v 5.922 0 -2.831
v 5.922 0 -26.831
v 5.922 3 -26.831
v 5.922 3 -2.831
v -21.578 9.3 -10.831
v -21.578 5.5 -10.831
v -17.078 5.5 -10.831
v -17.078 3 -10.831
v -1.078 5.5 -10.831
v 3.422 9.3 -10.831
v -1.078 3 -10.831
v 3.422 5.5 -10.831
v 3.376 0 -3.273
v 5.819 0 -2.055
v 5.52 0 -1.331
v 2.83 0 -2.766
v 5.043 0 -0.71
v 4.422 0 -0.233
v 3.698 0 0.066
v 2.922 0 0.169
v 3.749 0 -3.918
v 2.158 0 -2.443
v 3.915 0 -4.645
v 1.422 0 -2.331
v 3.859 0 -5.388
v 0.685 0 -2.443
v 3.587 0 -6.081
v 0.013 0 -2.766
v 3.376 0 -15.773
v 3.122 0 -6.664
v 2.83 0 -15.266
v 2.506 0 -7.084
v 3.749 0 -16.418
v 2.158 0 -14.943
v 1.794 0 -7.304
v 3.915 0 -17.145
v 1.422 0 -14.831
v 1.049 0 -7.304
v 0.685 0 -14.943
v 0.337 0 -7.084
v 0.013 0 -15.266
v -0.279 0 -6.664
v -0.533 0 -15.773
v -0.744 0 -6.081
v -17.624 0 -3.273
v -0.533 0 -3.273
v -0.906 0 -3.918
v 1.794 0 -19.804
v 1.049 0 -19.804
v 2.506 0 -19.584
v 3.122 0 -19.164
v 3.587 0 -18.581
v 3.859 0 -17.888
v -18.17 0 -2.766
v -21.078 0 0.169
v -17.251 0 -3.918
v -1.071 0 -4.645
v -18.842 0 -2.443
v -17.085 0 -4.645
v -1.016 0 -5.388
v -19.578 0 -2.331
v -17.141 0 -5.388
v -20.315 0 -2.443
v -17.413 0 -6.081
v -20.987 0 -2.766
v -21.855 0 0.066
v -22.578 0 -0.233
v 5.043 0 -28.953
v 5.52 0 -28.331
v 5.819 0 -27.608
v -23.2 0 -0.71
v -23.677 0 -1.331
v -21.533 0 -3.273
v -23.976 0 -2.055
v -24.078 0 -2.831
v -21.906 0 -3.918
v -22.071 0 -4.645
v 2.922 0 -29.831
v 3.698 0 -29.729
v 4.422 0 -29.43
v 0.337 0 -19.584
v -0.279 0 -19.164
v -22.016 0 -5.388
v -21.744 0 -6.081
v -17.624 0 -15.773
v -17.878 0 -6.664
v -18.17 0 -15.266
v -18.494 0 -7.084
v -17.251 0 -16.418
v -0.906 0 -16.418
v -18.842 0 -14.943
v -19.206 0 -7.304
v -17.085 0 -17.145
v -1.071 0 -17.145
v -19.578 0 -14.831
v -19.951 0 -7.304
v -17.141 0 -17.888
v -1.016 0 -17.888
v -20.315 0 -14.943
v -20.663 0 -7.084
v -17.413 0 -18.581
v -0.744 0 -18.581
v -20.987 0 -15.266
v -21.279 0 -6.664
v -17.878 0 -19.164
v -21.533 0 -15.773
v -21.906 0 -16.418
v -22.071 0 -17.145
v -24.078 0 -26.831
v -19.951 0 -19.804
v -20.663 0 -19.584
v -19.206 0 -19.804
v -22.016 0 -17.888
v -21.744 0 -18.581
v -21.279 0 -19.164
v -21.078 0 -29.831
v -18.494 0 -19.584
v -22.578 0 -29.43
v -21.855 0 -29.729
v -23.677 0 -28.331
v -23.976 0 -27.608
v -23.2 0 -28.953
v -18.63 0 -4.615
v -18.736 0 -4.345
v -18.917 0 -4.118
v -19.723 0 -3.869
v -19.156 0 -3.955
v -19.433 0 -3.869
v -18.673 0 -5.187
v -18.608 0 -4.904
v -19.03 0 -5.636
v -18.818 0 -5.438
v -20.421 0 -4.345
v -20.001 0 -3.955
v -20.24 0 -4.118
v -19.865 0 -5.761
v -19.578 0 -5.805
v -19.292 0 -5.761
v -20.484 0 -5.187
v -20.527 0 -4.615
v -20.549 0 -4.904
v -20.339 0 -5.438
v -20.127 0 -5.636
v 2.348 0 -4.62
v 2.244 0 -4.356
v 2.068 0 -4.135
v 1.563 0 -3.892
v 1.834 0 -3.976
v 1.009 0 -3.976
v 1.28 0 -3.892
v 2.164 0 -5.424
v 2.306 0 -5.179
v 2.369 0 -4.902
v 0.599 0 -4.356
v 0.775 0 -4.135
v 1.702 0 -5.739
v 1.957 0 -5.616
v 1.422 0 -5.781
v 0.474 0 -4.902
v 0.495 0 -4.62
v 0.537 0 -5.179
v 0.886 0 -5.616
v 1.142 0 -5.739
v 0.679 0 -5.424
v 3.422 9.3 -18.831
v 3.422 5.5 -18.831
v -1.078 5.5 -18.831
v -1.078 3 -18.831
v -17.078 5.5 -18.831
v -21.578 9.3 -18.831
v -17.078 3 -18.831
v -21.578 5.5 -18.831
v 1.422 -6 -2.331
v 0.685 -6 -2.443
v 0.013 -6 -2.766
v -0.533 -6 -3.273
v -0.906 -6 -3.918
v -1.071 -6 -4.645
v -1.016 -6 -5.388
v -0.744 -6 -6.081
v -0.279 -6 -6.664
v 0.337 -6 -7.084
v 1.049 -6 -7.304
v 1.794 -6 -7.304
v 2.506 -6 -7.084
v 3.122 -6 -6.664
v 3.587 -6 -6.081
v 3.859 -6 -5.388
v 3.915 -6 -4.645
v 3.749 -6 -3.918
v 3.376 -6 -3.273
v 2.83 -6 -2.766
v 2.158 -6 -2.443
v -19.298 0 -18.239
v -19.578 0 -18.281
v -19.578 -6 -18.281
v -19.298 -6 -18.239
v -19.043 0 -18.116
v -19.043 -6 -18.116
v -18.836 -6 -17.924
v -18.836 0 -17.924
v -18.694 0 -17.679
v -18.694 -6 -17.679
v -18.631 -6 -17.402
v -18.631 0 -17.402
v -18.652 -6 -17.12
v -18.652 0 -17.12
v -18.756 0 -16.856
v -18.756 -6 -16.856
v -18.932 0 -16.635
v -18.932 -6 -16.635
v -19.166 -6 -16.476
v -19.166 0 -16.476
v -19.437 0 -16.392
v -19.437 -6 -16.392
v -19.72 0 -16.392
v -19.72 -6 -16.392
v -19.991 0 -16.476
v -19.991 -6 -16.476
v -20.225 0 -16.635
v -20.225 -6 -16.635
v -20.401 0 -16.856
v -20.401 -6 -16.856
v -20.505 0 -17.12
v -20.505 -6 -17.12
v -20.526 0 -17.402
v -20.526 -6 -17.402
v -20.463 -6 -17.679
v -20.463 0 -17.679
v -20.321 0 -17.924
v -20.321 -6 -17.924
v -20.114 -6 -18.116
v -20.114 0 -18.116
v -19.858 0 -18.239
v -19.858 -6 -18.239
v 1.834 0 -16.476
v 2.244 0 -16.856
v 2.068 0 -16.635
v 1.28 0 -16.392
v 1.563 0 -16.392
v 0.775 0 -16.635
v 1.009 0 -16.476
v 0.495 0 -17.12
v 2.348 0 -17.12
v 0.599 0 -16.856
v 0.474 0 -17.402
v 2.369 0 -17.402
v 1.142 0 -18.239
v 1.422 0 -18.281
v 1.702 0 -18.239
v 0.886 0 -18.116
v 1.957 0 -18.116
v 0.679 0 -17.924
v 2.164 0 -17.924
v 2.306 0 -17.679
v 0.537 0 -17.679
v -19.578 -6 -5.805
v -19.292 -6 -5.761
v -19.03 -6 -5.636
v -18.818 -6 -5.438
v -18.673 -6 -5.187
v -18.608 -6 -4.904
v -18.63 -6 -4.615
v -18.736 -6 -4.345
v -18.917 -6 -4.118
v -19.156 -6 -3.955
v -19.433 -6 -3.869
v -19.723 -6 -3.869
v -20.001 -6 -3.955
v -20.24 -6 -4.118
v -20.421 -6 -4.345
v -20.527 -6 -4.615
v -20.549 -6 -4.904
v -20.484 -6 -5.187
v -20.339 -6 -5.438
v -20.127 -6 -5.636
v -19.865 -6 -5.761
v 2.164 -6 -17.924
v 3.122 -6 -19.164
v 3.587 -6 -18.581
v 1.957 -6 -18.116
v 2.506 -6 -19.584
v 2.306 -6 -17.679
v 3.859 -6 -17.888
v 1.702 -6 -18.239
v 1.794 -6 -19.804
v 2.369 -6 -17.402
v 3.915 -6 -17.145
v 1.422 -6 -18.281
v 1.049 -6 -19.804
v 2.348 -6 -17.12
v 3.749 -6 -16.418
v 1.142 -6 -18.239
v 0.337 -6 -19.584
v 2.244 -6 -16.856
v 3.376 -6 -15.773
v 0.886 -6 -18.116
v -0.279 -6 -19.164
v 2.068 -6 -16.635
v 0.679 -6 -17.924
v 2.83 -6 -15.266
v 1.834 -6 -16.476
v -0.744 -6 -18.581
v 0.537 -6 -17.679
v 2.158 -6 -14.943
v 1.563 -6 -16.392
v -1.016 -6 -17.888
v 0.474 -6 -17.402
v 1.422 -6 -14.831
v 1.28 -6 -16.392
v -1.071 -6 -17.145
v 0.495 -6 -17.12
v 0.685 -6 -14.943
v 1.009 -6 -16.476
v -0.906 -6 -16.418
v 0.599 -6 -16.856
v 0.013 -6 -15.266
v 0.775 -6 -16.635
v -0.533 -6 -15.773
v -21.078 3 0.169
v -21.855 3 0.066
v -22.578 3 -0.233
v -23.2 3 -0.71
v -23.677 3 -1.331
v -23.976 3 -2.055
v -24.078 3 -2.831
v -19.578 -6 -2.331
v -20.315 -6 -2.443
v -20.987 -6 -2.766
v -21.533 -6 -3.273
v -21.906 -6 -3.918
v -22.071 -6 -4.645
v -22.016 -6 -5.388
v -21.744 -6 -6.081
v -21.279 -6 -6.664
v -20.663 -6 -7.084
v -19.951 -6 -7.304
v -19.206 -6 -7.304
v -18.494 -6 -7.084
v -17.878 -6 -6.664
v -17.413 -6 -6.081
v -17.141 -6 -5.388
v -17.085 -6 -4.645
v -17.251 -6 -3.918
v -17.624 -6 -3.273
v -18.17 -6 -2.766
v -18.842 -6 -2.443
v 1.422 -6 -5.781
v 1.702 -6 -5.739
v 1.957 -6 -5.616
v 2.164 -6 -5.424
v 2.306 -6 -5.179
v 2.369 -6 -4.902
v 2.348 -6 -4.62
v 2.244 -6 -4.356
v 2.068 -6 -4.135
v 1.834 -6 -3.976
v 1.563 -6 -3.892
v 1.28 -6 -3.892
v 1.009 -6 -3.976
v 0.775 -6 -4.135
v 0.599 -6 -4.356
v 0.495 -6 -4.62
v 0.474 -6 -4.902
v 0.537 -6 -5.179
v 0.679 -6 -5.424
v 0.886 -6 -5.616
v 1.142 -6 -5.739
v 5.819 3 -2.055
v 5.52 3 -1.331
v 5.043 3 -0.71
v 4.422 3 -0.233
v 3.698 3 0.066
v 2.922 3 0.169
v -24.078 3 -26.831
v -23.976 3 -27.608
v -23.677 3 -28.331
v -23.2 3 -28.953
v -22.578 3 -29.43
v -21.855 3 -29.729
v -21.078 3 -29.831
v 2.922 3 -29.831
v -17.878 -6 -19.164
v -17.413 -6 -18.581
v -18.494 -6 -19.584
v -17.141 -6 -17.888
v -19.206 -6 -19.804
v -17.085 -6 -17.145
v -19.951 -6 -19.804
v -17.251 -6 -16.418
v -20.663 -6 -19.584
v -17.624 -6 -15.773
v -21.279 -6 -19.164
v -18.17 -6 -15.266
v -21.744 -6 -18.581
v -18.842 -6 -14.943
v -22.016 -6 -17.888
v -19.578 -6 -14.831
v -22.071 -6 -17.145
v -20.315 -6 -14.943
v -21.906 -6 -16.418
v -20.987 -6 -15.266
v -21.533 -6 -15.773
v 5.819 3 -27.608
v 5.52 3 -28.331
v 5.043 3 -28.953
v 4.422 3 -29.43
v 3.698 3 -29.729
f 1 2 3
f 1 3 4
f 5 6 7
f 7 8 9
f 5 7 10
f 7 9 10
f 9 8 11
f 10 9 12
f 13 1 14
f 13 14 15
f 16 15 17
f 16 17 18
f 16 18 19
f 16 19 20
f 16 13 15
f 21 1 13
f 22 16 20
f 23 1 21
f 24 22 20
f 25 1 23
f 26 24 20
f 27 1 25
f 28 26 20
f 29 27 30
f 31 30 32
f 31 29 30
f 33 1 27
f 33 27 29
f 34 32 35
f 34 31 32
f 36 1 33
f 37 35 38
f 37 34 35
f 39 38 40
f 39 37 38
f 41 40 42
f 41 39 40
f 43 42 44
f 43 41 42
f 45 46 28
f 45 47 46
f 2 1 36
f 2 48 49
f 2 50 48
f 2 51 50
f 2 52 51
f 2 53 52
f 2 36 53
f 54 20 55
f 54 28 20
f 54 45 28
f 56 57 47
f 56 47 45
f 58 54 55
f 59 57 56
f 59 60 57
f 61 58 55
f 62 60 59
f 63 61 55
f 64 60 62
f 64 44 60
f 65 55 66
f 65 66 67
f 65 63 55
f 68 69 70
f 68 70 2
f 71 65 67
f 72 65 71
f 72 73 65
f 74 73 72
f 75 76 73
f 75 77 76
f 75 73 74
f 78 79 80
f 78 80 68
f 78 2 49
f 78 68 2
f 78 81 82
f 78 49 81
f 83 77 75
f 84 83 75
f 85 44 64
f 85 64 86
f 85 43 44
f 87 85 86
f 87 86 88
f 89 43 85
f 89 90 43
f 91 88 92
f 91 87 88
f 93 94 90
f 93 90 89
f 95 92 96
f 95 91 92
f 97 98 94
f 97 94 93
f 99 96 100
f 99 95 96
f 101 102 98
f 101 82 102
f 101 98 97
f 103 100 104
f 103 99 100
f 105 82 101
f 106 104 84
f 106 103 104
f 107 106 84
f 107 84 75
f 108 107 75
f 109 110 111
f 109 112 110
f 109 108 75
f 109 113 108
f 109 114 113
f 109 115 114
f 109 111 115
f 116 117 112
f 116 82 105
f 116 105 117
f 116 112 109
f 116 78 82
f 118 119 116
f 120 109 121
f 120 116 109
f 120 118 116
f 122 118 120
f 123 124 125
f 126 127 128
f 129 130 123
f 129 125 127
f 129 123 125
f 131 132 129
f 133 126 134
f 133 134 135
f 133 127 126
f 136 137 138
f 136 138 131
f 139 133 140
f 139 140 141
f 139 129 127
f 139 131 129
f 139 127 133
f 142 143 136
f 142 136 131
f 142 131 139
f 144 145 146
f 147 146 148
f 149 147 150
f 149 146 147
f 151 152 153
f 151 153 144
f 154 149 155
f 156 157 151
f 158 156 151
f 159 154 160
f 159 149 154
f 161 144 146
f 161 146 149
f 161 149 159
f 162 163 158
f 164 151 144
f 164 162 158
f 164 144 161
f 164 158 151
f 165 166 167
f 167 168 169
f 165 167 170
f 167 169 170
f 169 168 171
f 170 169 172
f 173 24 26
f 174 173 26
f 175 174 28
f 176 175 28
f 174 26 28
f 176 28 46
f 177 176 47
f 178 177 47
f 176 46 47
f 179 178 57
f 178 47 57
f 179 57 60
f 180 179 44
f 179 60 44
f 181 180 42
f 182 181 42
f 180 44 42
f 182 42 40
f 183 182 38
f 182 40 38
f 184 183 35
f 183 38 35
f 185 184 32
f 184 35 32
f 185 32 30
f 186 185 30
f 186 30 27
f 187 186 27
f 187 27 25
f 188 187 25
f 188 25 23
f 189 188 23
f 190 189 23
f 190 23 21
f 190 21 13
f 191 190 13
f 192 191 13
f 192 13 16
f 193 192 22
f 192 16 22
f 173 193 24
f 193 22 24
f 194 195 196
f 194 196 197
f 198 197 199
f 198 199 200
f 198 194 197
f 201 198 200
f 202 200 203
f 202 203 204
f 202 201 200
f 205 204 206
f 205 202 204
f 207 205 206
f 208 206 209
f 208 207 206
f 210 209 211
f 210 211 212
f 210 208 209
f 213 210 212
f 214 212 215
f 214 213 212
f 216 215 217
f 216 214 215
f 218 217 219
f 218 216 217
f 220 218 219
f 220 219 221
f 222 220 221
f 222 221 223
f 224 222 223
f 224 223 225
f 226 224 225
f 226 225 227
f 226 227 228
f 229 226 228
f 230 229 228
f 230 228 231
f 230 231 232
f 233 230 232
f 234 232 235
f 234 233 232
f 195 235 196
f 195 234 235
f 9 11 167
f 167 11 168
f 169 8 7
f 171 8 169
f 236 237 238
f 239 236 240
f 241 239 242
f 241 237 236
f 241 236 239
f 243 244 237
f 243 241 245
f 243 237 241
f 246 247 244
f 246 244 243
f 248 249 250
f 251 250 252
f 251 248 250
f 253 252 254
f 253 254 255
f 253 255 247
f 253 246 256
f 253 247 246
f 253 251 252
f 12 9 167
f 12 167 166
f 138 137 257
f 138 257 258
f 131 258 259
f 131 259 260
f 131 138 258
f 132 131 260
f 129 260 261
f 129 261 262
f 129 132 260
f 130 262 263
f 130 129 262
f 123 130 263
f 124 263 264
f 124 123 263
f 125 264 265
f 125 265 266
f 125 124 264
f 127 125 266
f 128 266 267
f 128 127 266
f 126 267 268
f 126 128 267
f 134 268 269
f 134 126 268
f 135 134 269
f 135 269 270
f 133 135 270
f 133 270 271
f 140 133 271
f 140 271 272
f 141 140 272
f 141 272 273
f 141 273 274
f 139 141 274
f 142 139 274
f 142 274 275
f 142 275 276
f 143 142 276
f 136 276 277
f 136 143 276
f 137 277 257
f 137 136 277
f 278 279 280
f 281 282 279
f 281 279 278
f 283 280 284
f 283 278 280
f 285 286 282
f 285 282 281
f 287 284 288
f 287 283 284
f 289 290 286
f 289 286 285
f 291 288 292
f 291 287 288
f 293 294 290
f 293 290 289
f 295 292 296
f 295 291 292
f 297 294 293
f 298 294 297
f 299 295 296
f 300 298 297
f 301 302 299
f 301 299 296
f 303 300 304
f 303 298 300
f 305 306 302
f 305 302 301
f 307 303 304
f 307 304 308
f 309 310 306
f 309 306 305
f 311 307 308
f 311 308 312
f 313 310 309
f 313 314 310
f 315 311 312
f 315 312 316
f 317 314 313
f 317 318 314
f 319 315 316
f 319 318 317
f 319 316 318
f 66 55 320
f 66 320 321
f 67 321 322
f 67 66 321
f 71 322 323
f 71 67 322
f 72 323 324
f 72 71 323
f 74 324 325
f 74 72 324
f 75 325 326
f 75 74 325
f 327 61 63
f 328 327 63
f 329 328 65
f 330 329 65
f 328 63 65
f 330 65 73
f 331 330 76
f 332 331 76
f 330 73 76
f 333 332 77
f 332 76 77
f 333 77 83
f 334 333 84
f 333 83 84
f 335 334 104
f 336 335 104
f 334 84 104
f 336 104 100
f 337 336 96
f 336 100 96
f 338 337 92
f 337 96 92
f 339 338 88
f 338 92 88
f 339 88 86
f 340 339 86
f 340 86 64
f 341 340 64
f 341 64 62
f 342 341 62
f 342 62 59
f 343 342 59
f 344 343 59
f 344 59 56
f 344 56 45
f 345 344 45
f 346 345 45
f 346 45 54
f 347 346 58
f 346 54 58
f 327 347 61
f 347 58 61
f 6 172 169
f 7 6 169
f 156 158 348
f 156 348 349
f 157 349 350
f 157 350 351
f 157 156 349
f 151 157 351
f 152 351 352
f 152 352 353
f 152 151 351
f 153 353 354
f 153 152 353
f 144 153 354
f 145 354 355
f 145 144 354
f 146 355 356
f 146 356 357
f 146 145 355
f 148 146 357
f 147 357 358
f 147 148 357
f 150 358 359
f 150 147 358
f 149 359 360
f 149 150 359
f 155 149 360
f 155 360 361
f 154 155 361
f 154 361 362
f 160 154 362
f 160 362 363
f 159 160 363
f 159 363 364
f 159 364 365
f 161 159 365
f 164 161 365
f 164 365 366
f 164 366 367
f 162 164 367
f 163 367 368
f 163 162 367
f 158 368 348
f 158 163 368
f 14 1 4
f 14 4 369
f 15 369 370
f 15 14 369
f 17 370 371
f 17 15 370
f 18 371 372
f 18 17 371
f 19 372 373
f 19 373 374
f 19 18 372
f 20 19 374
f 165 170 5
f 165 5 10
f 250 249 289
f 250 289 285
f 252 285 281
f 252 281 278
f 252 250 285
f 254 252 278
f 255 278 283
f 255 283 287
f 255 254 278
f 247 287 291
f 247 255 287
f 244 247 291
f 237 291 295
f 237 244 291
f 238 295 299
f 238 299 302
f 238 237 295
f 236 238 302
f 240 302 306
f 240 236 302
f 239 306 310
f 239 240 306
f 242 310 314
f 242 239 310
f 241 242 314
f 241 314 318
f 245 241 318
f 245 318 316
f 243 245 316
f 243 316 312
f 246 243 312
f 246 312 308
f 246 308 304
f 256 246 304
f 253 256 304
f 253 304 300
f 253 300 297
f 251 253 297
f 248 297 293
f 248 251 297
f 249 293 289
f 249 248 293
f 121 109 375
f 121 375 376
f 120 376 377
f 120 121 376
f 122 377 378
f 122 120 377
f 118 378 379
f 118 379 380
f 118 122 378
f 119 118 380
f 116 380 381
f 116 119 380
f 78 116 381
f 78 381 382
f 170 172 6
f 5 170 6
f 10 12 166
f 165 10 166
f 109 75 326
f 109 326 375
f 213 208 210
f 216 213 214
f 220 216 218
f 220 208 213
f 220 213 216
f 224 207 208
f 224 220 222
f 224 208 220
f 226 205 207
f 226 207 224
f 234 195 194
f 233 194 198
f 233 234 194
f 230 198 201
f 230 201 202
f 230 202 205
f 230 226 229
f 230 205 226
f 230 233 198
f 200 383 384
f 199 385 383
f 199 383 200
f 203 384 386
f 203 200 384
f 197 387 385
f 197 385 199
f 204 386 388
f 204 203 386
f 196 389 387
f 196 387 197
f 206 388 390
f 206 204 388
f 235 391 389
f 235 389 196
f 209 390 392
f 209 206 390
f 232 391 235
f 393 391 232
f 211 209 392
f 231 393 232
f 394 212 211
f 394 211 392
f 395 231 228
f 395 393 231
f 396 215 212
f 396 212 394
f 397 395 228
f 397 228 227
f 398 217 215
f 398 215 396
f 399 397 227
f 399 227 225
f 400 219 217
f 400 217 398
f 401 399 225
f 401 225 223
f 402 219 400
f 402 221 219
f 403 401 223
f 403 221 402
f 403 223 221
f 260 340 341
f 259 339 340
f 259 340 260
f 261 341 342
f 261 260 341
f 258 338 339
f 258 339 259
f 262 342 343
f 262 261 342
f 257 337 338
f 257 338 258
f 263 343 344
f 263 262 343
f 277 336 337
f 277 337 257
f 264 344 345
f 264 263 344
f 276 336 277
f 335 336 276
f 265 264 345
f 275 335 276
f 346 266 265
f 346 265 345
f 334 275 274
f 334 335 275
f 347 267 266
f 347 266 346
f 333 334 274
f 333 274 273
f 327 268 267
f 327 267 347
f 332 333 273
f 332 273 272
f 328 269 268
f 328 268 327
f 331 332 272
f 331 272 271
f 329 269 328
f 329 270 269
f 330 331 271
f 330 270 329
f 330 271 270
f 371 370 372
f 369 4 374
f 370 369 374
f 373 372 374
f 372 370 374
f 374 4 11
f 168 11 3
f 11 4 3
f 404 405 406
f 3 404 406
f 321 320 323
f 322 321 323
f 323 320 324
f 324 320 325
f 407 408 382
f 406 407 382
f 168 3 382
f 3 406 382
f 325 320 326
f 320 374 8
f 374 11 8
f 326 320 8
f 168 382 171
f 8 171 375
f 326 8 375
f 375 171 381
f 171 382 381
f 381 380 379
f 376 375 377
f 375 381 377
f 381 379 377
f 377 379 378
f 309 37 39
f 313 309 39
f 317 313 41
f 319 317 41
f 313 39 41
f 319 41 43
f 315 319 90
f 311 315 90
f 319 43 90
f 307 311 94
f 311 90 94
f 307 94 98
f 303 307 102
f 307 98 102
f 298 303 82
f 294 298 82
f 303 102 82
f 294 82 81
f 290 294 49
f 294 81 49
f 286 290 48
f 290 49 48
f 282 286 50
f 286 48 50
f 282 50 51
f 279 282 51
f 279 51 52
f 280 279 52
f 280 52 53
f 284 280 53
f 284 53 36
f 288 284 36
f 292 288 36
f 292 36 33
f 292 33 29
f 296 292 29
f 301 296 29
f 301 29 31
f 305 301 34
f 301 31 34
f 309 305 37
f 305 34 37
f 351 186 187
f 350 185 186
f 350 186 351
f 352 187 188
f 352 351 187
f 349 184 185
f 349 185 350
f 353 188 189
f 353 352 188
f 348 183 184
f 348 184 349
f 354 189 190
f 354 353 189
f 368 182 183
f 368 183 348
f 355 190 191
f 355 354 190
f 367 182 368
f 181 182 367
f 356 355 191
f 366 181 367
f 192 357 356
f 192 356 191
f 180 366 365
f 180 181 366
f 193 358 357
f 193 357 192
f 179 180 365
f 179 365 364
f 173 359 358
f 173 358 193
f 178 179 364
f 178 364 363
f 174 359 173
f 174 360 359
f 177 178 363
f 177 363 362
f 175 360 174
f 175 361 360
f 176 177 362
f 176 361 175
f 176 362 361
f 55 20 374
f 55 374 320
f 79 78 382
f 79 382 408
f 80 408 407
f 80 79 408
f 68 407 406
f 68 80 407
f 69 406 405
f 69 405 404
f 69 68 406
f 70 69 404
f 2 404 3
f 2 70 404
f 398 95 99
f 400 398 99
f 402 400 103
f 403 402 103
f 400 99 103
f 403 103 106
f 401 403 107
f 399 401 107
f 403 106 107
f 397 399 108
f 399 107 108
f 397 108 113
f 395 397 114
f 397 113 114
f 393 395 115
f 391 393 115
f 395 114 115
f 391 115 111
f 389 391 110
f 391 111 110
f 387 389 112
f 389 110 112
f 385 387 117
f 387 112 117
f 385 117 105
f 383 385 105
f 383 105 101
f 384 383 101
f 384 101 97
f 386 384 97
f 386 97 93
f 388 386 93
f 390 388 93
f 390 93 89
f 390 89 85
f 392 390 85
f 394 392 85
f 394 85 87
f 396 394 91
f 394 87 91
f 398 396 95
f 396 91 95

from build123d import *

# Parameters (mm, degrees)
EXTRUDE_2_DEPTH = 3
SKETCH_4_R      = 2.5
SKETCH_4_R_2    = 0.95
SKETCH_4_R_3    = 0.973149492
EXTRUDE_5_DEPTH = 6
SKETCH_6_W      = 16
SKETCH_6_H      = 8
EXTRUDE_6_DEPTH = 2.5
EXTRUDE_7_DEPTH = 3.8


with BuildPart() as part:
    # Эскиз1 → Бобышка-Вытянуть2 (new body)
    with BuildSketch(Plane(origin=(0, 0, 0), x_dir=(1, 0, 0), z_dir=(0, 1, 0))):
        with BuildLine():
            Line((-21.078452696, 29.831456886), (2.921547304, 29.831456886))
            ThreePointArc((2.921547304, 29.831456886), (5.042867648, 28.95277723), (5.921547304, 26.831456886))
            Line((5.921547304, 26.831456886), (5.921547304, 2.831456886))
            ThreePointArc((5.921547304, 2.831456886), (5.042867648, 0.710136543), (2.921547304, -0.168543114))
            Line((2.921547304, -0.168543114), (-21.078452696, -0.168543114))
            ThreePointArc((-21.078452696, -0.168543114), (-23.19977304, 0.710136543), (-24.078452696, 2.831456886))
            Line((-24.078452696, 2.831456886), (-24.078452696, 26.831456886))
            ThreePointArc((-24.078452696, 26.831456886), (-23.19977304, 28.95277723), (-21.078452696, 29.831456886))
        make_face()
    extrude(amount=EXTRUDE_2_DEPTH)

    # Эскиз4 → Бобышка-Вытянуть5 (add)
    # profile 1 of 4: a face of its own
    with BuildSketch(Plane.XZ):
        with Locations(Location((1.421547304, -4.831456886, 0), (0, 0, 90))):
            Circle(SKETCH_4_R)
        with Locations(Location((1.421547304, -4.831456886, 0), (0, 0, 270))):
            Circle(SKETCH_4_R_2, mode=Mode.SUBTRACT)
    # profile 2 of 4: a face of its own
    with BuildSketch(Plane.XZ):
        with Locations(Location((-19.578452696, -4.831456886, 0), (0, 0, 90))):
            Circle(SKETCH_4_R)
        with Locations(Location((-19.578452696, -4.831456886, 0), (0, 0, 270))):
            Circle(SKETCH_4_R_3, mode=Mode.SUBTRACT)
    # profile 3 of 4: a face of its own
    with BuildSketch(Plane.XZ):
        with Locations(Location((1.421547304, -17.331456886, 0), (0, 0, 90))):
            Circle(SKETCH_4_R)
        with Locations(Location((1.421547304, -17.331456886, 0), (0, 0, 270))):
            Circle(SKETCH_4_R_2, mode=Mode.SUBTRACT)
    # profile 4 of 4: a face of its own
    with BuildSketch(Plane.XZ):
        with Locations(Location((-19.578452696, -17.331456886, 0), (0, 0, 90))):
            Circle(SKETCH_4_R)
        with Locations(Location((-19.578452696, -17.331456886, 0), (0, 0, 270))):
            Circle(SKETCH_4_R_2, mode=Mode.SUBTRACT)
    extrude(amount=EXTRUDE_5_DEPTH)

    # Эскиз6 → Бобышка-Вытянуть6 (add)
    with BuildSketch(Plane(origin=(0, 3, 0), x_dir=(1, 0, 0), z_dir=(0, 1, 0))):
        with Locations((-9.078452696, 14.831456886)):
            Rectangle(SKETCH_6_W, SKETCH_6_H)
    extrude(amount=EXTRUDE_6_DEPTH)

    # Эскиз7 → Бобышка-Вытянуть7 (add)
    with BuildSketch(Plane(origin=(0, 5.5, 0), x_dir=(1, 0, 0), z_dir=(0, 1, 0))):
        Polygon((-9.078452696, 18.831456886), (-21.578452696, 18.831456886), (-21.578452696, 10.831456886), (3.421547304, 10.831456886), (3.421547304, 18.831456886), align=None)
    extrude(amount=EXTRUDE_7_DEPTH)


solid = part.part
